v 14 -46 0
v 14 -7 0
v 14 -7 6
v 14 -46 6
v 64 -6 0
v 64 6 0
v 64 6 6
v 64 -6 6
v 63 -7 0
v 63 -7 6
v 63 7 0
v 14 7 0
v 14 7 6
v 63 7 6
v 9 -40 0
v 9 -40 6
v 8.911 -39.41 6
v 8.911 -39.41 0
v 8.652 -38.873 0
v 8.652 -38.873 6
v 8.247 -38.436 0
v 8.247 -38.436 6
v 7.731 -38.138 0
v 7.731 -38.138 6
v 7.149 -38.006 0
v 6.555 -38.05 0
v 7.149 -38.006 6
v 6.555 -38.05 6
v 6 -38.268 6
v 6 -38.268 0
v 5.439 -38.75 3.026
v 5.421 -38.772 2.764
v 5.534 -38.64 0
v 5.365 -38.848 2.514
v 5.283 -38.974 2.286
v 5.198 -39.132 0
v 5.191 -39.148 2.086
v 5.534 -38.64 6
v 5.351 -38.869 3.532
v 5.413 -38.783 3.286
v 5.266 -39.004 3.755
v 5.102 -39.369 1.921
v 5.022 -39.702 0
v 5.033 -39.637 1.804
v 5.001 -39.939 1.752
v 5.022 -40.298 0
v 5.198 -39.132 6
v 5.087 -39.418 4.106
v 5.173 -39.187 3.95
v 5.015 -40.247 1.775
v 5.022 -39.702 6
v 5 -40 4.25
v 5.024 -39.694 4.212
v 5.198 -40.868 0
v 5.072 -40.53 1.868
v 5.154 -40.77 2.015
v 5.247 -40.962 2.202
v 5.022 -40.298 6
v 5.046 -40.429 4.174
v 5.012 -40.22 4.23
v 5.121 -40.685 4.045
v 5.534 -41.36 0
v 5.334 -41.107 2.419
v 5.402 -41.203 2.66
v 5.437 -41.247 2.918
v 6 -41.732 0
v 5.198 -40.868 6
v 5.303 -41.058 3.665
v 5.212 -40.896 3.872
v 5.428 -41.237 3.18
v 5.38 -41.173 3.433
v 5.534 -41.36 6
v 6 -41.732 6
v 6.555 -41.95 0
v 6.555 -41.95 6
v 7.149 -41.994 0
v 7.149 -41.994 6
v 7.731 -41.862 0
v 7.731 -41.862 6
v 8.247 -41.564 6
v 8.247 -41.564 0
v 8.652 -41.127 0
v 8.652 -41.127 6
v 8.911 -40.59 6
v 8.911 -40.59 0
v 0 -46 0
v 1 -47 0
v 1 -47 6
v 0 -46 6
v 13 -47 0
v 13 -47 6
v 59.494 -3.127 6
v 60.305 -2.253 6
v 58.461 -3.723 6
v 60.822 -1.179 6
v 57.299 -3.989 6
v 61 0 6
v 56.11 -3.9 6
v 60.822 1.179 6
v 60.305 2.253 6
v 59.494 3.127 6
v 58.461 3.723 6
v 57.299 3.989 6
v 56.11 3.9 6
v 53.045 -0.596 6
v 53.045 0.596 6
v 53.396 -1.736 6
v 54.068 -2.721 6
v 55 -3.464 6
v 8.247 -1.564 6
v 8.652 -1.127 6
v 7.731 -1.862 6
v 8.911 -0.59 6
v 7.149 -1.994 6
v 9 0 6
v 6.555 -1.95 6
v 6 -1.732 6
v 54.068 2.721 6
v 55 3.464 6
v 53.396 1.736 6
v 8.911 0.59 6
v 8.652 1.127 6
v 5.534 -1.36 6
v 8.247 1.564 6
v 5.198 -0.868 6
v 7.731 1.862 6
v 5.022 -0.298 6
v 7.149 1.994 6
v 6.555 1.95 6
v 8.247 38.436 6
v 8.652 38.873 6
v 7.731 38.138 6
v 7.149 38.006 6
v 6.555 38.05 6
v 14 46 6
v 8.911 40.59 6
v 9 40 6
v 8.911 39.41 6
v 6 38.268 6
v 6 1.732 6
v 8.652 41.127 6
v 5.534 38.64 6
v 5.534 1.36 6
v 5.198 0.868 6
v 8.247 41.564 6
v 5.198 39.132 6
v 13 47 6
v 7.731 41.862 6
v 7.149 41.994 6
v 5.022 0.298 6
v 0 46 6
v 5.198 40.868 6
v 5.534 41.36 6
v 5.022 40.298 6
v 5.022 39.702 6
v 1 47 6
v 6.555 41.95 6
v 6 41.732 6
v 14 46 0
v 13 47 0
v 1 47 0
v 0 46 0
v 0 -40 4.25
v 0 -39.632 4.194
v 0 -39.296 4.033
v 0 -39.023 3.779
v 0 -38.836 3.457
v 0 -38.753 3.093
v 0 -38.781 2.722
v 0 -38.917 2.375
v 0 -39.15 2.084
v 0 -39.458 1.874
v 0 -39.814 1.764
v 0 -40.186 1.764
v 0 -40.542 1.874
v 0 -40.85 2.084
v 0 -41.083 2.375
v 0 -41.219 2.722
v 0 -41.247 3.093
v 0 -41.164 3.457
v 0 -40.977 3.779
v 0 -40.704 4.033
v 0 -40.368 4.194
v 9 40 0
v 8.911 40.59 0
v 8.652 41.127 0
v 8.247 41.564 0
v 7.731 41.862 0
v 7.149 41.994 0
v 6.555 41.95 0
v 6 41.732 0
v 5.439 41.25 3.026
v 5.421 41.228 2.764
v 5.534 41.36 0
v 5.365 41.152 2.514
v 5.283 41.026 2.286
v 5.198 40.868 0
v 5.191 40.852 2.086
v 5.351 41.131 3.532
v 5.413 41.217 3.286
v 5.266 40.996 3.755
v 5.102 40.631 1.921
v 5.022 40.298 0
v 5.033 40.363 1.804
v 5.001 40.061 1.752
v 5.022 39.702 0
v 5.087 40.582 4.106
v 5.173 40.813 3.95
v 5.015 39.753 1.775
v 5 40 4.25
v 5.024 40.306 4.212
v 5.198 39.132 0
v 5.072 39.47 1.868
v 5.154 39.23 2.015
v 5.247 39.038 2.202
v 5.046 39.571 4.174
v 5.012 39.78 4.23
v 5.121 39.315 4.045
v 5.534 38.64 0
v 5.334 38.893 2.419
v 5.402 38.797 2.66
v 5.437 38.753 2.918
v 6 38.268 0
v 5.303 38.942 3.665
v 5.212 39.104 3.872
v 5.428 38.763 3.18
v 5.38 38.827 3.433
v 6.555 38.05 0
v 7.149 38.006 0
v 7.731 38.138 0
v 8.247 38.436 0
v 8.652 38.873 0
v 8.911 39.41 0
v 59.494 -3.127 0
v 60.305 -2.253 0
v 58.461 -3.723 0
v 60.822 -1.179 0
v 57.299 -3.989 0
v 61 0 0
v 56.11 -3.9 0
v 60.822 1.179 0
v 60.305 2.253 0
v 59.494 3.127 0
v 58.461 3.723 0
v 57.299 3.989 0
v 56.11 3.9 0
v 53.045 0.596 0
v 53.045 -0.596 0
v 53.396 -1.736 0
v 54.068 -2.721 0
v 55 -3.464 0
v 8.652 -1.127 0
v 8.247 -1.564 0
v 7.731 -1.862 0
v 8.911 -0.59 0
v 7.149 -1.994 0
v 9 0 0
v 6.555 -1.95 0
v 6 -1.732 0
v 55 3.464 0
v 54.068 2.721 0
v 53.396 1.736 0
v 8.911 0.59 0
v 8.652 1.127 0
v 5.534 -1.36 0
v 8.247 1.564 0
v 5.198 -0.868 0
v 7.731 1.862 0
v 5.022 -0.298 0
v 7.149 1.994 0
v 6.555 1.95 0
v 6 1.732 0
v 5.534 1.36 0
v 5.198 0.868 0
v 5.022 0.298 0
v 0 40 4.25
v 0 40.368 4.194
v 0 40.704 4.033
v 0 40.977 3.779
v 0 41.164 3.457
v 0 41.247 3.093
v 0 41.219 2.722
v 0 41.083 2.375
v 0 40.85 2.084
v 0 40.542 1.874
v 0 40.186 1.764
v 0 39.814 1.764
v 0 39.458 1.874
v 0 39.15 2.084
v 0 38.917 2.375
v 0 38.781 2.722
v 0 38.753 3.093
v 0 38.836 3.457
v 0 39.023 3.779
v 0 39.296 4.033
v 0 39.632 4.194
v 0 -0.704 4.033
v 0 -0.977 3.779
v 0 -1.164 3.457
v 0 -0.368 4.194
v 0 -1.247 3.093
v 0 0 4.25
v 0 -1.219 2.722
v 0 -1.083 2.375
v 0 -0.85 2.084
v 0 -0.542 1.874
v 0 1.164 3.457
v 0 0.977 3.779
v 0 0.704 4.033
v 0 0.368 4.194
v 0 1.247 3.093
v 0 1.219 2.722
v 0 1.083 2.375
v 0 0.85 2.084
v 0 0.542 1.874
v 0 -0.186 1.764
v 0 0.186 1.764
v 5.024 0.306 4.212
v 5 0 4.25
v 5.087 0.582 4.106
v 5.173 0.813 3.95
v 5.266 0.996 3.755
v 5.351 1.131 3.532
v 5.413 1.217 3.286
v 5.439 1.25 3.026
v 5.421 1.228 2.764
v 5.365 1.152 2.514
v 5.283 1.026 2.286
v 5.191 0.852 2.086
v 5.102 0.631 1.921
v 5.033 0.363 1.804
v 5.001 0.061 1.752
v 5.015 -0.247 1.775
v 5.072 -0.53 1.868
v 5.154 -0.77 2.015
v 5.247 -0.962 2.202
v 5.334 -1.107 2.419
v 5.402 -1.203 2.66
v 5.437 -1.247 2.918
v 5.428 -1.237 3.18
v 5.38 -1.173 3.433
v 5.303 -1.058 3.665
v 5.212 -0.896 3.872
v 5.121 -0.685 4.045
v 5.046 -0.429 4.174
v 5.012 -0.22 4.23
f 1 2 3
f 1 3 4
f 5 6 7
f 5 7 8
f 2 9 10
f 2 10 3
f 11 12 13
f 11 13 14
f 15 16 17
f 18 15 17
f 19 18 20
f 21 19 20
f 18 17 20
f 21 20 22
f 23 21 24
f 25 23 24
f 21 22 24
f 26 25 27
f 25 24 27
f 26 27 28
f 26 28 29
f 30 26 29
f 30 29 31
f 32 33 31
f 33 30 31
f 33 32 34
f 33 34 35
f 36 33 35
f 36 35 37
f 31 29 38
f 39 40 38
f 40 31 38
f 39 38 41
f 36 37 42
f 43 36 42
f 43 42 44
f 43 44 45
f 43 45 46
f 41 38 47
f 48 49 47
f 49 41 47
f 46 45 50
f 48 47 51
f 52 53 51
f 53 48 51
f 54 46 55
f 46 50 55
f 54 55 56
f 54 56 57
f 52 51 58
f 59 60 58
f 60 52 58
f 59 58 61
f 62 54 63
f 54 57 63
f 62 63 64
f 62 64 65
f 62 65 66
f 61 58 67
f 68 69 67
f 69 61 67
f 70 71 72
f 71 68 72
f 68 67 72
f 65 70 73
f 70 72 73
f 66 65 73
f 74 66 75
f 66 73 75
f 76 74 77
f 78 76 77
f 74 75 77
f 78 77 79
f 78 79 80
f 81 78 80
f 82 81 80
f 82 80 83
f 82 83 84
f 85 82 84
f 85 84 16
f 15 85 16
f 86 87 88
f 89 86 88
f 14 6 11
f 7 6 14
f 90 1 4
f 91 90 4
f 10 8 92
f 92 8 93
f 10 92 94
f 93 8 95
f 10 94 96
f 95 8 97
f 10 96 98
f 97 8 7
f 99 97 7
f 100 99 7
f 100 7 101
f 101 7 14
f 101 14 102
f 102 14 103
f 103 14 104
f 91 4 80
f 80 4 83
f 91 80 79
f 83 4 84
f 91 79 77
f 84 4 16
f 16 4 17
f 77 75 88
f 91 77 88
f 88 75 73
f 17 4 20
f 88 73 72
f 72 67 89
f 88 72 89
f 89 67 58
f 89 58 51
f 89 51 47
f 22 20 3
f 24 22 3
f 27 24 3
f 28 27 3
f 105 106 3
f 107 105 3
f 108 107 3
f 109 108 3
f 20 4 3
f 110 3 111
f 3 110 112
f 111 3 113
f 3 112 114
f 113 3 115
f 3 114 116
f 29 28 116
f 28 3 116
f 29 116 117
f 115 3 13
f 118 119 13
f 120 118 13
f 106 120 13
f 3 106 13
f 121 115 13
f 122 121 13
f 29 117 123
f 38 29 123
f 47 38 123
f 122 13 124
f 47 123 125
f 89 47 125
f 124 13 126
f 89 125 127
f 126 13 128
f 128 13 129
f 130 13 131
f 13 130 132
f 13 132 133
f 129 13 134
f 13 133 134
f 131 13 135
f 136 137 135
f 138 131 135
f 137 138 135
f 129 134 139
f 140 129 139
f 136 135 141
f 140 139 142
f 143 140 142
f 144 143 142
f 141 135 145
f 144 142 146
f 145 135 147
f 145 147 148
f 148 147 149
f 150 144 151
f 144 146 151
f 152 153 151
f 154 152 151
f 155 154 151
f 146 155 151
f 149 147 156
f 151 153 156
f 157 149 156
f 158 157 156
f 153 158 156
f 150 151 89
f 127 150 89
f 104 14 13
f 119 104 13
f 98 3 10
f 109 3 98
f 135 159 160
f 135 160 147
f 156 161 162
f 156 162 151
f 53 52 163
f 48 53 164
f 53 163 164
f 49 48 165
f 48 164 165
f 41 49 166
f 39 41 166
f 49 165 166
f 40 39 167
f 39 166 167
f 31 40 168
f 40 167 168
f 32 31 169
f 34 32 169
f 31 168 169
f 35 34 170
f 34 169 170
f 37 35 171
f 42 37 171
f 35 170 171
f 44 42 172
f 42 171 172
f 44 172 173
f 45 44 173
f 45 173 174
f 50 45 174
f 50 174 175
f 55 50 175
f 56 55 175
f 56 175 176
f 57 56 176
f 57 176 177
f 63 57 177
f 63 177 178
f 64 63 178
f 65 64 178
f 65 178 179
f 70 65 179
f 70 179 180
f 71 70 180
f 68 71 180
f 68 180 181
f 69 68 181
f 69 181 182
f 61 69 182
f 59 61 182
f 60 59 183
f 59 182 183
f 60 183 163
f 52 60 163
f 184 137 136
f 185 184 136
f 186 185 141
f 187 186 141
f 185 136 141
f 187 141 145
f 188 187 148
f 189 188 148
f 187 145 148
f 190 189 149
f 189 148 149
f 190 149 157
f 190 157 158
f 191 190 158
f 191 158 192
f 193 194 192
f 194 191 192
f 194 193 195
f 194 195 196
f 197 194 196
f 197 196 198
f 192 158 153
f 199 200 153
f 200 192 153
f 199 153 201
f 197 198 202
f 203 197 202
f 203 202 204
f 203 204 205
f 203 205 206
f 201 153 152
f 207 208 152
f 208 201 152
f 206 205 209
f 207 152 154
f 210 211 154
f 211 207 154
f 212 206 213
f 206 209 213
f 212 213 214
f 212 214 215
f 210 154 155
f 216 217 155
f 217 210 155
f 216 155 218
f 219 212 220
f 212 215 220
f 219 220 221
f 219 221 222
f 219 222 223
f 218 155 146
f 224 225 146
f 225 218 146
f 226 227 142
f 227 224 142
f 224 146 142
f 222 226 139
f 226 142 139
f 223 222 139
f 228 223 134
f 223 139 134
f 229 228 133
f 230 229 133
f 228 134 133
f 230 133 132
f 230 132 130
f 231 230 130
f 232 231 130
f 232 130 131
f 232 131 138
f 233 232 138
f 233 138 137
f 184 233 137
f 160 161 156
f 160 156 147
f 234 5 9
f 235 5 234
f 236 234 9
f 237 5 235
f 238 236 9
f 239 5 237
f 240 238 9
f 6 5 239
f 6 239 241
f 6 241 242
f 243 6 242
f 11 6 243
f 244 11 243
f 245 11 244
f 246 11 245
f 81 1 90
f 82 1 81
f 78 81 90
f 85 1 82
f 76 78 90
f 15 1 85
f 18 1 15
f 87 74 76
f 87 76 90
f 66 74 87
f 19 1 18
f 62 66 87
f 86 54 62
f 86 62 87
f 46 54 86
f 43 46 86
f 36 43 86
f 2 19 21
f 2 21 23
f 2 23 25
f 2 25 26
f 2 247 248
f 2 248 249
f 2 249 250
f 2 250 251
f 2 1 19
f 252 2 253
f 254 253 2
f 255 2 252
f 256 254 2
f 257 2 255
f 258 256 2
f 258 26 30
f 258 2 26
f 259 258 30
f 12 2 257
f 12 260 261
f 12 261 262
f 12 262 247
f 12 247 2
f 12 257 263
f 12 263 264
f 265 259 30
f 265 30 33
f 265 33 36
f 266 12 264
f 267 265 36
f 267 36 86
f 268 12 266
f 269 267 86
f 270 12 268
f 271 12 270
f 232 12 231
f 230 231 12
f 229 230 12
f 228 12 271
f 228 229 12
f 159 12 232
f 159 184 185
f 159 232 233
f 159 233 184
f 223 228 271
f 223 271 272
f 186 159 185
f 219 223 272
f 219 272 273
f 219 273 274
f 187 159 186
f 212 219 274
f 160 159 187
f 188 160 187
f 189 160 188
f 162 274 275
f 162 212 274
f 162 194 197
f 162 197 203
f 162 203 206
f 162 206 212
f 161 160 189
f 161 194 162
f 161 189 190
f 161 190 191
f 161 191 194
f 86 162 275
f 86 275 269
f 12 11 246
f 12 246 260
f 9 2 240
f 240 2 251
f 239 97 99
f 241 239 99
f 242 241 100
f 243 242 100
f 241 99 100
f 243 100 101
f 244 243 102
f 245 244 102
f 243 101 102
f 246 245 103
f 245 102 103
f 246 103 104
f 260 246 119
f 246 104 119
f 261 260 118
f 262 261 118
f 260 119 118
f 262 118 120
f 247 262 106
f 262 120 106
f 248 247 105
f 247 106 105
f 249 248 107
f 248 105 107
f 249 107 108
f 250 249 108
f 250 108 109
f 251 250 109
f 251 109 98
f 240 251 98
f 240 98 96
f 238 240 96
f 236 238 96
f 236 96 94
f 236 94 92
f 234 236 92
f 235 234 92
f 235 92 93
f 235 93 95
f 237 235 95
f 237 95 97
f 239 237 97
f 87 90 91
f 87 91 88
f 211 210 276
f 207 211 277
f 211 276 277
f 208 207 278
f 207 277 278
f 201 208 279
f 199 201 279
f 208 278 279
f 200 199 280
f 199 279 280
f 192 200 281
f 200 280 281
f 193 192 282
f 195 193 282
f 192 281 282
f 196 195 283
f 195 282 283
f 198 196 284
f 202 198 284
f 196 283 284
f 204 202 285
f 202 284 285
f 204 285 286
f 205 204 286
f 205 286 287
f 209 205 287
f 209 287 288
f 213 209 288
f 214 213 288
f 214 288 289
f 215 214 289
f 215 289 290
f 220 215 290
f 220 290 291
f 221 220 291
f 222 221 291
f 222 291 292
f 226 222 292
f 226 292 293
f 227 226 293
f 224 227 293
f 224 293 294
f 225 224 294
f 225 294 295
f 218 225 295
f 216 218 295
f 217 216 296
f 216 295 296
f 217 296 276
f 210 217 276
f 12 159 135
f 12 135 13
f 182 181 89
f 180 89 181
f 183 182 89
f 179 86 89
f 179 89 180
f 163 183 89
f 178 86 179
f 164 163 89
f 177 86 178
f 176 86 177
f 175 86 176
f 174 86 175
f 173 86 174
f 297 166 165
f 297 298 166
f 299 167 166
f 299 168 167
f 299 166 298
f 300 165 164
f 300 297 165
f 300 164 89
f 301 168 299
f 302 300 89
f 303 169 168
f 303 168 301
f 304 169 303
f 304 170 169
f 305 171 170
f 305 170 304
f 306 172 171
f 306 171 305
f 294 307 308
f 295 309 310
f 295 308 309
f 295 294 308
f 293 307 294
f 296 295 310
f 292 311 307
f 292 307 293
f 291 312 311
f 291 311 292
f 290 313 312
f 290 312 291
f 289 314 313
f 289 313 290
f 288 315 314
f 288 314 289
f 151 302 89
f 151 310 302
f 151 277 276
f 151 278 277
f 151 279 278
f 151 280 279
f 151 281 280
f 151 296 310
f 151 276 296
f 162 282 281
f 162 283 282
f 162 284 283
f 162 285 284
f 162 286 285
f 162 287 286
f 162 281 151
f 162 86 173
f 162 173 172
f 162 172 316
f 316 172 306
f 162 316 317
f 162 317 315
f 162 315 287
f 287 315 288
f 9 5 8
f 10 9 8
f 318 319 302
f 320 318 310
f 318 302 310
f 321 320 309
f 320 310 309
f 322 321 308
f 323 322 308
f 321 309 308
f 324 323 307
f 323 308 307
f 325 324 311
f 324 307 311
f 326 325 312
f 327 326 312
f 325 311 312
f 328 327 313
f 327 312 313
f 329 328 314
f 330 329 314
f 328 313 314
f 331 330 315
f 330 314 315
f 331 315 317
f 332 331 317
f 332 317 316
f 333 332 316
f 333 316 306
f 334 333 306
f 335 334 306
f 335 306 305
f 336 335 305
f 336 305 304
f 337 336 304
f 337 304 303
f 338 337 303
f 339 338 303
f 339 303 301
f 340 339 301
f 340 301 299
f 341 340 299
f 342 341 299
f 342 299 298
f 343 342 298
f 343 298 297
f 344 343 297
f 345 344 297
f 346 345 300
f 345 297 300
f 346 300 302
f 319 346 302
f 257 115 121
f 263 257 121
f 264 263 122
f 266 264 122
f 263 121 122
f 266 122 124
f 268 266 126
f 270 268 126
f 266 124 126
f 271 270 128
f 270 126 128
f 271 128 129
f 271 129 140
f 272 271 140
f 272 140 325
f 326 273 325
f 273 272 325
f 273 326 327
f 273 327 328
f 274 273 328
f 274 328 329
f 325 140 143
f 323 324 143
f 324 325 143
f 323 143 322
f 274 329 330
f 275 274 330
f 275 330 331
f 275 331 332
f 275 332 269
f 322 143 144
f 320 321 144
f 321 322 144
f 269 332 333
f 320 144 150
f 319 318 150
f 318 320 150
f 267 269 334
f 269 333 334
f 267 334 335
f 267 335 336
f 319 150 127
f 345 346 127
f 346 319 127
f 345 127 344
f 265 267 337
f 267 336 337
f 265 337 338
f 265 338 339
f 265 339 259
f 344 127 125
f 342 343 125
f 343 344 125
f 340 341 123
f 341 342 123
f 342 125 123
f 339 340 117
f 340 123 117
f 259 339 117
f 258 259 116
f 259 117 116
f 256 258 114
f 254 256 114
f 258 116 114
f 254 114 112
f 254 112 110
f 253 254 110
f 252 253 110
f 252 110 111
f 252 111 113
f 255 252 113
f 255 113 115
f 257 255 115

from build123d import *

# Parameters (mm, degrees)
EXTRUDE_1_DEPTH     = 6
SKETCH_4_R          = 2
SKETCH_4_R_2        = 4
CUT_EXTRUDE_2_DEPTH = 80.630396206
M3X0_5_1_REACH      = 81.63
M3X0_5_1_BORE_R     = 1.25
CHAMFER_1_SIZE      = 1


with BuildPart() as part:
    # ｽｹｯﾁ3 → ﾎﾞｽ - 押し出し1 (new body)
    with BuildSketch(Plane.XY):
        Polygon((0, -47), (0, 47), (14, 47), (14, 7), (64, 7), (64, -7), (14, -7), (14, -47), align=None)
    extrude(amount=EXTRUDE_1_DEPTH)

    # ｽｹｯﾁ4 → ｶｯﾄ - 押し出し2 (cut, through all)
    with BuildSketch(Plane.XY.offset(6)):
        with Locations((7, 40)):
            Circle(SKETCH_4_R)
        with Locations((7, -40)):
            Circle(SKETCH_4_R)
        with Locations((7, 0)):
            Circle(SKETCH_4_R)
        with Locations((57, 0)):
            Circle(SKETCH_4_R_2)
    extrude(amount=-CUT_EXTRUDE_2_DEPTH, mode=Mode.SUBTRACT)

    # M3x0.5 ねじ穴1 bore → M3x0.5 ねじ穴1 (cut, up to next)
    with BuildSketch(Plane.ZY, mode=Mode.PRIVATE) as m3x0_5_1_sk1:
        with Locations((3, -40)):
            Circle(M3X0_5_1_BORE_R)
    m3x0_5_1_tool1 = extrude(m3x0_5_1_sk1.sketch, amount=-M3X0_5_1_REACH, mode=Mode.PRIVATE) & part.part
    # M3x0.5 ねじ穴1 bore → M3x0.5 ねじ穴1 (cut, up to next)
    with BuildSketch(Plane.ZY, mode=Mode.PRIVATE) as m3x0_5_1_sk2:
        with Locations((3, 40)):
            Circle(M3X0_5_1_BORE_R)
    m3x0_5_1_tool2 = extrude(m3x0_5_1_sk2.sketch, amount=-M3X0_5_1_REACH, mode=Mode.PRIVATE) & part.part
    # M3x0.5 ねじ穴1 bore → M3x0.5 ねじ穴1 (cut, up to next)
    with BuildSketch(Plane.ZY, mode=Mode.PRIVATE) as m3x0_5_1_sk3:
        with Locations((3, 0)):
            Circle(M3X0_5_1_BORE_R)
    m3x0_5_1_tool3 = extrude(m3x0_5_1_sk3.sketch, amount=-M3X0_5_1_REACH, mode=Mode.PRIVATE) & part.part
    add(m3x0_5_1_tool1.solids().sort_by_distance((0, -40, 3))[0], mode=Mode.SUBTRACT)
    add(m3x0_5_1_tool2.solids().sort_by_distance((0, 40, 3))[0], mode=Mode.SUBTRACT)
    add(m3x0_5_1_tool3.solids().sort_by_distance((0, 0, 3))[0], mode=Mode.SUBTRACT)

    # 面取り1
    chamfer_1_edges = [part.edges().sort_by_distance(p)[0] for p in [
        (64, 7, 3),
        (64, -7, 3),
        (14, -47, 3),
        (0, -47, 3),
        (0, 47, 3),
        (14, 47, 3),
    ]]
    chamfer(chamfer_1_edges, length=CHAMFER_1_SIZE)


solid = part.part
